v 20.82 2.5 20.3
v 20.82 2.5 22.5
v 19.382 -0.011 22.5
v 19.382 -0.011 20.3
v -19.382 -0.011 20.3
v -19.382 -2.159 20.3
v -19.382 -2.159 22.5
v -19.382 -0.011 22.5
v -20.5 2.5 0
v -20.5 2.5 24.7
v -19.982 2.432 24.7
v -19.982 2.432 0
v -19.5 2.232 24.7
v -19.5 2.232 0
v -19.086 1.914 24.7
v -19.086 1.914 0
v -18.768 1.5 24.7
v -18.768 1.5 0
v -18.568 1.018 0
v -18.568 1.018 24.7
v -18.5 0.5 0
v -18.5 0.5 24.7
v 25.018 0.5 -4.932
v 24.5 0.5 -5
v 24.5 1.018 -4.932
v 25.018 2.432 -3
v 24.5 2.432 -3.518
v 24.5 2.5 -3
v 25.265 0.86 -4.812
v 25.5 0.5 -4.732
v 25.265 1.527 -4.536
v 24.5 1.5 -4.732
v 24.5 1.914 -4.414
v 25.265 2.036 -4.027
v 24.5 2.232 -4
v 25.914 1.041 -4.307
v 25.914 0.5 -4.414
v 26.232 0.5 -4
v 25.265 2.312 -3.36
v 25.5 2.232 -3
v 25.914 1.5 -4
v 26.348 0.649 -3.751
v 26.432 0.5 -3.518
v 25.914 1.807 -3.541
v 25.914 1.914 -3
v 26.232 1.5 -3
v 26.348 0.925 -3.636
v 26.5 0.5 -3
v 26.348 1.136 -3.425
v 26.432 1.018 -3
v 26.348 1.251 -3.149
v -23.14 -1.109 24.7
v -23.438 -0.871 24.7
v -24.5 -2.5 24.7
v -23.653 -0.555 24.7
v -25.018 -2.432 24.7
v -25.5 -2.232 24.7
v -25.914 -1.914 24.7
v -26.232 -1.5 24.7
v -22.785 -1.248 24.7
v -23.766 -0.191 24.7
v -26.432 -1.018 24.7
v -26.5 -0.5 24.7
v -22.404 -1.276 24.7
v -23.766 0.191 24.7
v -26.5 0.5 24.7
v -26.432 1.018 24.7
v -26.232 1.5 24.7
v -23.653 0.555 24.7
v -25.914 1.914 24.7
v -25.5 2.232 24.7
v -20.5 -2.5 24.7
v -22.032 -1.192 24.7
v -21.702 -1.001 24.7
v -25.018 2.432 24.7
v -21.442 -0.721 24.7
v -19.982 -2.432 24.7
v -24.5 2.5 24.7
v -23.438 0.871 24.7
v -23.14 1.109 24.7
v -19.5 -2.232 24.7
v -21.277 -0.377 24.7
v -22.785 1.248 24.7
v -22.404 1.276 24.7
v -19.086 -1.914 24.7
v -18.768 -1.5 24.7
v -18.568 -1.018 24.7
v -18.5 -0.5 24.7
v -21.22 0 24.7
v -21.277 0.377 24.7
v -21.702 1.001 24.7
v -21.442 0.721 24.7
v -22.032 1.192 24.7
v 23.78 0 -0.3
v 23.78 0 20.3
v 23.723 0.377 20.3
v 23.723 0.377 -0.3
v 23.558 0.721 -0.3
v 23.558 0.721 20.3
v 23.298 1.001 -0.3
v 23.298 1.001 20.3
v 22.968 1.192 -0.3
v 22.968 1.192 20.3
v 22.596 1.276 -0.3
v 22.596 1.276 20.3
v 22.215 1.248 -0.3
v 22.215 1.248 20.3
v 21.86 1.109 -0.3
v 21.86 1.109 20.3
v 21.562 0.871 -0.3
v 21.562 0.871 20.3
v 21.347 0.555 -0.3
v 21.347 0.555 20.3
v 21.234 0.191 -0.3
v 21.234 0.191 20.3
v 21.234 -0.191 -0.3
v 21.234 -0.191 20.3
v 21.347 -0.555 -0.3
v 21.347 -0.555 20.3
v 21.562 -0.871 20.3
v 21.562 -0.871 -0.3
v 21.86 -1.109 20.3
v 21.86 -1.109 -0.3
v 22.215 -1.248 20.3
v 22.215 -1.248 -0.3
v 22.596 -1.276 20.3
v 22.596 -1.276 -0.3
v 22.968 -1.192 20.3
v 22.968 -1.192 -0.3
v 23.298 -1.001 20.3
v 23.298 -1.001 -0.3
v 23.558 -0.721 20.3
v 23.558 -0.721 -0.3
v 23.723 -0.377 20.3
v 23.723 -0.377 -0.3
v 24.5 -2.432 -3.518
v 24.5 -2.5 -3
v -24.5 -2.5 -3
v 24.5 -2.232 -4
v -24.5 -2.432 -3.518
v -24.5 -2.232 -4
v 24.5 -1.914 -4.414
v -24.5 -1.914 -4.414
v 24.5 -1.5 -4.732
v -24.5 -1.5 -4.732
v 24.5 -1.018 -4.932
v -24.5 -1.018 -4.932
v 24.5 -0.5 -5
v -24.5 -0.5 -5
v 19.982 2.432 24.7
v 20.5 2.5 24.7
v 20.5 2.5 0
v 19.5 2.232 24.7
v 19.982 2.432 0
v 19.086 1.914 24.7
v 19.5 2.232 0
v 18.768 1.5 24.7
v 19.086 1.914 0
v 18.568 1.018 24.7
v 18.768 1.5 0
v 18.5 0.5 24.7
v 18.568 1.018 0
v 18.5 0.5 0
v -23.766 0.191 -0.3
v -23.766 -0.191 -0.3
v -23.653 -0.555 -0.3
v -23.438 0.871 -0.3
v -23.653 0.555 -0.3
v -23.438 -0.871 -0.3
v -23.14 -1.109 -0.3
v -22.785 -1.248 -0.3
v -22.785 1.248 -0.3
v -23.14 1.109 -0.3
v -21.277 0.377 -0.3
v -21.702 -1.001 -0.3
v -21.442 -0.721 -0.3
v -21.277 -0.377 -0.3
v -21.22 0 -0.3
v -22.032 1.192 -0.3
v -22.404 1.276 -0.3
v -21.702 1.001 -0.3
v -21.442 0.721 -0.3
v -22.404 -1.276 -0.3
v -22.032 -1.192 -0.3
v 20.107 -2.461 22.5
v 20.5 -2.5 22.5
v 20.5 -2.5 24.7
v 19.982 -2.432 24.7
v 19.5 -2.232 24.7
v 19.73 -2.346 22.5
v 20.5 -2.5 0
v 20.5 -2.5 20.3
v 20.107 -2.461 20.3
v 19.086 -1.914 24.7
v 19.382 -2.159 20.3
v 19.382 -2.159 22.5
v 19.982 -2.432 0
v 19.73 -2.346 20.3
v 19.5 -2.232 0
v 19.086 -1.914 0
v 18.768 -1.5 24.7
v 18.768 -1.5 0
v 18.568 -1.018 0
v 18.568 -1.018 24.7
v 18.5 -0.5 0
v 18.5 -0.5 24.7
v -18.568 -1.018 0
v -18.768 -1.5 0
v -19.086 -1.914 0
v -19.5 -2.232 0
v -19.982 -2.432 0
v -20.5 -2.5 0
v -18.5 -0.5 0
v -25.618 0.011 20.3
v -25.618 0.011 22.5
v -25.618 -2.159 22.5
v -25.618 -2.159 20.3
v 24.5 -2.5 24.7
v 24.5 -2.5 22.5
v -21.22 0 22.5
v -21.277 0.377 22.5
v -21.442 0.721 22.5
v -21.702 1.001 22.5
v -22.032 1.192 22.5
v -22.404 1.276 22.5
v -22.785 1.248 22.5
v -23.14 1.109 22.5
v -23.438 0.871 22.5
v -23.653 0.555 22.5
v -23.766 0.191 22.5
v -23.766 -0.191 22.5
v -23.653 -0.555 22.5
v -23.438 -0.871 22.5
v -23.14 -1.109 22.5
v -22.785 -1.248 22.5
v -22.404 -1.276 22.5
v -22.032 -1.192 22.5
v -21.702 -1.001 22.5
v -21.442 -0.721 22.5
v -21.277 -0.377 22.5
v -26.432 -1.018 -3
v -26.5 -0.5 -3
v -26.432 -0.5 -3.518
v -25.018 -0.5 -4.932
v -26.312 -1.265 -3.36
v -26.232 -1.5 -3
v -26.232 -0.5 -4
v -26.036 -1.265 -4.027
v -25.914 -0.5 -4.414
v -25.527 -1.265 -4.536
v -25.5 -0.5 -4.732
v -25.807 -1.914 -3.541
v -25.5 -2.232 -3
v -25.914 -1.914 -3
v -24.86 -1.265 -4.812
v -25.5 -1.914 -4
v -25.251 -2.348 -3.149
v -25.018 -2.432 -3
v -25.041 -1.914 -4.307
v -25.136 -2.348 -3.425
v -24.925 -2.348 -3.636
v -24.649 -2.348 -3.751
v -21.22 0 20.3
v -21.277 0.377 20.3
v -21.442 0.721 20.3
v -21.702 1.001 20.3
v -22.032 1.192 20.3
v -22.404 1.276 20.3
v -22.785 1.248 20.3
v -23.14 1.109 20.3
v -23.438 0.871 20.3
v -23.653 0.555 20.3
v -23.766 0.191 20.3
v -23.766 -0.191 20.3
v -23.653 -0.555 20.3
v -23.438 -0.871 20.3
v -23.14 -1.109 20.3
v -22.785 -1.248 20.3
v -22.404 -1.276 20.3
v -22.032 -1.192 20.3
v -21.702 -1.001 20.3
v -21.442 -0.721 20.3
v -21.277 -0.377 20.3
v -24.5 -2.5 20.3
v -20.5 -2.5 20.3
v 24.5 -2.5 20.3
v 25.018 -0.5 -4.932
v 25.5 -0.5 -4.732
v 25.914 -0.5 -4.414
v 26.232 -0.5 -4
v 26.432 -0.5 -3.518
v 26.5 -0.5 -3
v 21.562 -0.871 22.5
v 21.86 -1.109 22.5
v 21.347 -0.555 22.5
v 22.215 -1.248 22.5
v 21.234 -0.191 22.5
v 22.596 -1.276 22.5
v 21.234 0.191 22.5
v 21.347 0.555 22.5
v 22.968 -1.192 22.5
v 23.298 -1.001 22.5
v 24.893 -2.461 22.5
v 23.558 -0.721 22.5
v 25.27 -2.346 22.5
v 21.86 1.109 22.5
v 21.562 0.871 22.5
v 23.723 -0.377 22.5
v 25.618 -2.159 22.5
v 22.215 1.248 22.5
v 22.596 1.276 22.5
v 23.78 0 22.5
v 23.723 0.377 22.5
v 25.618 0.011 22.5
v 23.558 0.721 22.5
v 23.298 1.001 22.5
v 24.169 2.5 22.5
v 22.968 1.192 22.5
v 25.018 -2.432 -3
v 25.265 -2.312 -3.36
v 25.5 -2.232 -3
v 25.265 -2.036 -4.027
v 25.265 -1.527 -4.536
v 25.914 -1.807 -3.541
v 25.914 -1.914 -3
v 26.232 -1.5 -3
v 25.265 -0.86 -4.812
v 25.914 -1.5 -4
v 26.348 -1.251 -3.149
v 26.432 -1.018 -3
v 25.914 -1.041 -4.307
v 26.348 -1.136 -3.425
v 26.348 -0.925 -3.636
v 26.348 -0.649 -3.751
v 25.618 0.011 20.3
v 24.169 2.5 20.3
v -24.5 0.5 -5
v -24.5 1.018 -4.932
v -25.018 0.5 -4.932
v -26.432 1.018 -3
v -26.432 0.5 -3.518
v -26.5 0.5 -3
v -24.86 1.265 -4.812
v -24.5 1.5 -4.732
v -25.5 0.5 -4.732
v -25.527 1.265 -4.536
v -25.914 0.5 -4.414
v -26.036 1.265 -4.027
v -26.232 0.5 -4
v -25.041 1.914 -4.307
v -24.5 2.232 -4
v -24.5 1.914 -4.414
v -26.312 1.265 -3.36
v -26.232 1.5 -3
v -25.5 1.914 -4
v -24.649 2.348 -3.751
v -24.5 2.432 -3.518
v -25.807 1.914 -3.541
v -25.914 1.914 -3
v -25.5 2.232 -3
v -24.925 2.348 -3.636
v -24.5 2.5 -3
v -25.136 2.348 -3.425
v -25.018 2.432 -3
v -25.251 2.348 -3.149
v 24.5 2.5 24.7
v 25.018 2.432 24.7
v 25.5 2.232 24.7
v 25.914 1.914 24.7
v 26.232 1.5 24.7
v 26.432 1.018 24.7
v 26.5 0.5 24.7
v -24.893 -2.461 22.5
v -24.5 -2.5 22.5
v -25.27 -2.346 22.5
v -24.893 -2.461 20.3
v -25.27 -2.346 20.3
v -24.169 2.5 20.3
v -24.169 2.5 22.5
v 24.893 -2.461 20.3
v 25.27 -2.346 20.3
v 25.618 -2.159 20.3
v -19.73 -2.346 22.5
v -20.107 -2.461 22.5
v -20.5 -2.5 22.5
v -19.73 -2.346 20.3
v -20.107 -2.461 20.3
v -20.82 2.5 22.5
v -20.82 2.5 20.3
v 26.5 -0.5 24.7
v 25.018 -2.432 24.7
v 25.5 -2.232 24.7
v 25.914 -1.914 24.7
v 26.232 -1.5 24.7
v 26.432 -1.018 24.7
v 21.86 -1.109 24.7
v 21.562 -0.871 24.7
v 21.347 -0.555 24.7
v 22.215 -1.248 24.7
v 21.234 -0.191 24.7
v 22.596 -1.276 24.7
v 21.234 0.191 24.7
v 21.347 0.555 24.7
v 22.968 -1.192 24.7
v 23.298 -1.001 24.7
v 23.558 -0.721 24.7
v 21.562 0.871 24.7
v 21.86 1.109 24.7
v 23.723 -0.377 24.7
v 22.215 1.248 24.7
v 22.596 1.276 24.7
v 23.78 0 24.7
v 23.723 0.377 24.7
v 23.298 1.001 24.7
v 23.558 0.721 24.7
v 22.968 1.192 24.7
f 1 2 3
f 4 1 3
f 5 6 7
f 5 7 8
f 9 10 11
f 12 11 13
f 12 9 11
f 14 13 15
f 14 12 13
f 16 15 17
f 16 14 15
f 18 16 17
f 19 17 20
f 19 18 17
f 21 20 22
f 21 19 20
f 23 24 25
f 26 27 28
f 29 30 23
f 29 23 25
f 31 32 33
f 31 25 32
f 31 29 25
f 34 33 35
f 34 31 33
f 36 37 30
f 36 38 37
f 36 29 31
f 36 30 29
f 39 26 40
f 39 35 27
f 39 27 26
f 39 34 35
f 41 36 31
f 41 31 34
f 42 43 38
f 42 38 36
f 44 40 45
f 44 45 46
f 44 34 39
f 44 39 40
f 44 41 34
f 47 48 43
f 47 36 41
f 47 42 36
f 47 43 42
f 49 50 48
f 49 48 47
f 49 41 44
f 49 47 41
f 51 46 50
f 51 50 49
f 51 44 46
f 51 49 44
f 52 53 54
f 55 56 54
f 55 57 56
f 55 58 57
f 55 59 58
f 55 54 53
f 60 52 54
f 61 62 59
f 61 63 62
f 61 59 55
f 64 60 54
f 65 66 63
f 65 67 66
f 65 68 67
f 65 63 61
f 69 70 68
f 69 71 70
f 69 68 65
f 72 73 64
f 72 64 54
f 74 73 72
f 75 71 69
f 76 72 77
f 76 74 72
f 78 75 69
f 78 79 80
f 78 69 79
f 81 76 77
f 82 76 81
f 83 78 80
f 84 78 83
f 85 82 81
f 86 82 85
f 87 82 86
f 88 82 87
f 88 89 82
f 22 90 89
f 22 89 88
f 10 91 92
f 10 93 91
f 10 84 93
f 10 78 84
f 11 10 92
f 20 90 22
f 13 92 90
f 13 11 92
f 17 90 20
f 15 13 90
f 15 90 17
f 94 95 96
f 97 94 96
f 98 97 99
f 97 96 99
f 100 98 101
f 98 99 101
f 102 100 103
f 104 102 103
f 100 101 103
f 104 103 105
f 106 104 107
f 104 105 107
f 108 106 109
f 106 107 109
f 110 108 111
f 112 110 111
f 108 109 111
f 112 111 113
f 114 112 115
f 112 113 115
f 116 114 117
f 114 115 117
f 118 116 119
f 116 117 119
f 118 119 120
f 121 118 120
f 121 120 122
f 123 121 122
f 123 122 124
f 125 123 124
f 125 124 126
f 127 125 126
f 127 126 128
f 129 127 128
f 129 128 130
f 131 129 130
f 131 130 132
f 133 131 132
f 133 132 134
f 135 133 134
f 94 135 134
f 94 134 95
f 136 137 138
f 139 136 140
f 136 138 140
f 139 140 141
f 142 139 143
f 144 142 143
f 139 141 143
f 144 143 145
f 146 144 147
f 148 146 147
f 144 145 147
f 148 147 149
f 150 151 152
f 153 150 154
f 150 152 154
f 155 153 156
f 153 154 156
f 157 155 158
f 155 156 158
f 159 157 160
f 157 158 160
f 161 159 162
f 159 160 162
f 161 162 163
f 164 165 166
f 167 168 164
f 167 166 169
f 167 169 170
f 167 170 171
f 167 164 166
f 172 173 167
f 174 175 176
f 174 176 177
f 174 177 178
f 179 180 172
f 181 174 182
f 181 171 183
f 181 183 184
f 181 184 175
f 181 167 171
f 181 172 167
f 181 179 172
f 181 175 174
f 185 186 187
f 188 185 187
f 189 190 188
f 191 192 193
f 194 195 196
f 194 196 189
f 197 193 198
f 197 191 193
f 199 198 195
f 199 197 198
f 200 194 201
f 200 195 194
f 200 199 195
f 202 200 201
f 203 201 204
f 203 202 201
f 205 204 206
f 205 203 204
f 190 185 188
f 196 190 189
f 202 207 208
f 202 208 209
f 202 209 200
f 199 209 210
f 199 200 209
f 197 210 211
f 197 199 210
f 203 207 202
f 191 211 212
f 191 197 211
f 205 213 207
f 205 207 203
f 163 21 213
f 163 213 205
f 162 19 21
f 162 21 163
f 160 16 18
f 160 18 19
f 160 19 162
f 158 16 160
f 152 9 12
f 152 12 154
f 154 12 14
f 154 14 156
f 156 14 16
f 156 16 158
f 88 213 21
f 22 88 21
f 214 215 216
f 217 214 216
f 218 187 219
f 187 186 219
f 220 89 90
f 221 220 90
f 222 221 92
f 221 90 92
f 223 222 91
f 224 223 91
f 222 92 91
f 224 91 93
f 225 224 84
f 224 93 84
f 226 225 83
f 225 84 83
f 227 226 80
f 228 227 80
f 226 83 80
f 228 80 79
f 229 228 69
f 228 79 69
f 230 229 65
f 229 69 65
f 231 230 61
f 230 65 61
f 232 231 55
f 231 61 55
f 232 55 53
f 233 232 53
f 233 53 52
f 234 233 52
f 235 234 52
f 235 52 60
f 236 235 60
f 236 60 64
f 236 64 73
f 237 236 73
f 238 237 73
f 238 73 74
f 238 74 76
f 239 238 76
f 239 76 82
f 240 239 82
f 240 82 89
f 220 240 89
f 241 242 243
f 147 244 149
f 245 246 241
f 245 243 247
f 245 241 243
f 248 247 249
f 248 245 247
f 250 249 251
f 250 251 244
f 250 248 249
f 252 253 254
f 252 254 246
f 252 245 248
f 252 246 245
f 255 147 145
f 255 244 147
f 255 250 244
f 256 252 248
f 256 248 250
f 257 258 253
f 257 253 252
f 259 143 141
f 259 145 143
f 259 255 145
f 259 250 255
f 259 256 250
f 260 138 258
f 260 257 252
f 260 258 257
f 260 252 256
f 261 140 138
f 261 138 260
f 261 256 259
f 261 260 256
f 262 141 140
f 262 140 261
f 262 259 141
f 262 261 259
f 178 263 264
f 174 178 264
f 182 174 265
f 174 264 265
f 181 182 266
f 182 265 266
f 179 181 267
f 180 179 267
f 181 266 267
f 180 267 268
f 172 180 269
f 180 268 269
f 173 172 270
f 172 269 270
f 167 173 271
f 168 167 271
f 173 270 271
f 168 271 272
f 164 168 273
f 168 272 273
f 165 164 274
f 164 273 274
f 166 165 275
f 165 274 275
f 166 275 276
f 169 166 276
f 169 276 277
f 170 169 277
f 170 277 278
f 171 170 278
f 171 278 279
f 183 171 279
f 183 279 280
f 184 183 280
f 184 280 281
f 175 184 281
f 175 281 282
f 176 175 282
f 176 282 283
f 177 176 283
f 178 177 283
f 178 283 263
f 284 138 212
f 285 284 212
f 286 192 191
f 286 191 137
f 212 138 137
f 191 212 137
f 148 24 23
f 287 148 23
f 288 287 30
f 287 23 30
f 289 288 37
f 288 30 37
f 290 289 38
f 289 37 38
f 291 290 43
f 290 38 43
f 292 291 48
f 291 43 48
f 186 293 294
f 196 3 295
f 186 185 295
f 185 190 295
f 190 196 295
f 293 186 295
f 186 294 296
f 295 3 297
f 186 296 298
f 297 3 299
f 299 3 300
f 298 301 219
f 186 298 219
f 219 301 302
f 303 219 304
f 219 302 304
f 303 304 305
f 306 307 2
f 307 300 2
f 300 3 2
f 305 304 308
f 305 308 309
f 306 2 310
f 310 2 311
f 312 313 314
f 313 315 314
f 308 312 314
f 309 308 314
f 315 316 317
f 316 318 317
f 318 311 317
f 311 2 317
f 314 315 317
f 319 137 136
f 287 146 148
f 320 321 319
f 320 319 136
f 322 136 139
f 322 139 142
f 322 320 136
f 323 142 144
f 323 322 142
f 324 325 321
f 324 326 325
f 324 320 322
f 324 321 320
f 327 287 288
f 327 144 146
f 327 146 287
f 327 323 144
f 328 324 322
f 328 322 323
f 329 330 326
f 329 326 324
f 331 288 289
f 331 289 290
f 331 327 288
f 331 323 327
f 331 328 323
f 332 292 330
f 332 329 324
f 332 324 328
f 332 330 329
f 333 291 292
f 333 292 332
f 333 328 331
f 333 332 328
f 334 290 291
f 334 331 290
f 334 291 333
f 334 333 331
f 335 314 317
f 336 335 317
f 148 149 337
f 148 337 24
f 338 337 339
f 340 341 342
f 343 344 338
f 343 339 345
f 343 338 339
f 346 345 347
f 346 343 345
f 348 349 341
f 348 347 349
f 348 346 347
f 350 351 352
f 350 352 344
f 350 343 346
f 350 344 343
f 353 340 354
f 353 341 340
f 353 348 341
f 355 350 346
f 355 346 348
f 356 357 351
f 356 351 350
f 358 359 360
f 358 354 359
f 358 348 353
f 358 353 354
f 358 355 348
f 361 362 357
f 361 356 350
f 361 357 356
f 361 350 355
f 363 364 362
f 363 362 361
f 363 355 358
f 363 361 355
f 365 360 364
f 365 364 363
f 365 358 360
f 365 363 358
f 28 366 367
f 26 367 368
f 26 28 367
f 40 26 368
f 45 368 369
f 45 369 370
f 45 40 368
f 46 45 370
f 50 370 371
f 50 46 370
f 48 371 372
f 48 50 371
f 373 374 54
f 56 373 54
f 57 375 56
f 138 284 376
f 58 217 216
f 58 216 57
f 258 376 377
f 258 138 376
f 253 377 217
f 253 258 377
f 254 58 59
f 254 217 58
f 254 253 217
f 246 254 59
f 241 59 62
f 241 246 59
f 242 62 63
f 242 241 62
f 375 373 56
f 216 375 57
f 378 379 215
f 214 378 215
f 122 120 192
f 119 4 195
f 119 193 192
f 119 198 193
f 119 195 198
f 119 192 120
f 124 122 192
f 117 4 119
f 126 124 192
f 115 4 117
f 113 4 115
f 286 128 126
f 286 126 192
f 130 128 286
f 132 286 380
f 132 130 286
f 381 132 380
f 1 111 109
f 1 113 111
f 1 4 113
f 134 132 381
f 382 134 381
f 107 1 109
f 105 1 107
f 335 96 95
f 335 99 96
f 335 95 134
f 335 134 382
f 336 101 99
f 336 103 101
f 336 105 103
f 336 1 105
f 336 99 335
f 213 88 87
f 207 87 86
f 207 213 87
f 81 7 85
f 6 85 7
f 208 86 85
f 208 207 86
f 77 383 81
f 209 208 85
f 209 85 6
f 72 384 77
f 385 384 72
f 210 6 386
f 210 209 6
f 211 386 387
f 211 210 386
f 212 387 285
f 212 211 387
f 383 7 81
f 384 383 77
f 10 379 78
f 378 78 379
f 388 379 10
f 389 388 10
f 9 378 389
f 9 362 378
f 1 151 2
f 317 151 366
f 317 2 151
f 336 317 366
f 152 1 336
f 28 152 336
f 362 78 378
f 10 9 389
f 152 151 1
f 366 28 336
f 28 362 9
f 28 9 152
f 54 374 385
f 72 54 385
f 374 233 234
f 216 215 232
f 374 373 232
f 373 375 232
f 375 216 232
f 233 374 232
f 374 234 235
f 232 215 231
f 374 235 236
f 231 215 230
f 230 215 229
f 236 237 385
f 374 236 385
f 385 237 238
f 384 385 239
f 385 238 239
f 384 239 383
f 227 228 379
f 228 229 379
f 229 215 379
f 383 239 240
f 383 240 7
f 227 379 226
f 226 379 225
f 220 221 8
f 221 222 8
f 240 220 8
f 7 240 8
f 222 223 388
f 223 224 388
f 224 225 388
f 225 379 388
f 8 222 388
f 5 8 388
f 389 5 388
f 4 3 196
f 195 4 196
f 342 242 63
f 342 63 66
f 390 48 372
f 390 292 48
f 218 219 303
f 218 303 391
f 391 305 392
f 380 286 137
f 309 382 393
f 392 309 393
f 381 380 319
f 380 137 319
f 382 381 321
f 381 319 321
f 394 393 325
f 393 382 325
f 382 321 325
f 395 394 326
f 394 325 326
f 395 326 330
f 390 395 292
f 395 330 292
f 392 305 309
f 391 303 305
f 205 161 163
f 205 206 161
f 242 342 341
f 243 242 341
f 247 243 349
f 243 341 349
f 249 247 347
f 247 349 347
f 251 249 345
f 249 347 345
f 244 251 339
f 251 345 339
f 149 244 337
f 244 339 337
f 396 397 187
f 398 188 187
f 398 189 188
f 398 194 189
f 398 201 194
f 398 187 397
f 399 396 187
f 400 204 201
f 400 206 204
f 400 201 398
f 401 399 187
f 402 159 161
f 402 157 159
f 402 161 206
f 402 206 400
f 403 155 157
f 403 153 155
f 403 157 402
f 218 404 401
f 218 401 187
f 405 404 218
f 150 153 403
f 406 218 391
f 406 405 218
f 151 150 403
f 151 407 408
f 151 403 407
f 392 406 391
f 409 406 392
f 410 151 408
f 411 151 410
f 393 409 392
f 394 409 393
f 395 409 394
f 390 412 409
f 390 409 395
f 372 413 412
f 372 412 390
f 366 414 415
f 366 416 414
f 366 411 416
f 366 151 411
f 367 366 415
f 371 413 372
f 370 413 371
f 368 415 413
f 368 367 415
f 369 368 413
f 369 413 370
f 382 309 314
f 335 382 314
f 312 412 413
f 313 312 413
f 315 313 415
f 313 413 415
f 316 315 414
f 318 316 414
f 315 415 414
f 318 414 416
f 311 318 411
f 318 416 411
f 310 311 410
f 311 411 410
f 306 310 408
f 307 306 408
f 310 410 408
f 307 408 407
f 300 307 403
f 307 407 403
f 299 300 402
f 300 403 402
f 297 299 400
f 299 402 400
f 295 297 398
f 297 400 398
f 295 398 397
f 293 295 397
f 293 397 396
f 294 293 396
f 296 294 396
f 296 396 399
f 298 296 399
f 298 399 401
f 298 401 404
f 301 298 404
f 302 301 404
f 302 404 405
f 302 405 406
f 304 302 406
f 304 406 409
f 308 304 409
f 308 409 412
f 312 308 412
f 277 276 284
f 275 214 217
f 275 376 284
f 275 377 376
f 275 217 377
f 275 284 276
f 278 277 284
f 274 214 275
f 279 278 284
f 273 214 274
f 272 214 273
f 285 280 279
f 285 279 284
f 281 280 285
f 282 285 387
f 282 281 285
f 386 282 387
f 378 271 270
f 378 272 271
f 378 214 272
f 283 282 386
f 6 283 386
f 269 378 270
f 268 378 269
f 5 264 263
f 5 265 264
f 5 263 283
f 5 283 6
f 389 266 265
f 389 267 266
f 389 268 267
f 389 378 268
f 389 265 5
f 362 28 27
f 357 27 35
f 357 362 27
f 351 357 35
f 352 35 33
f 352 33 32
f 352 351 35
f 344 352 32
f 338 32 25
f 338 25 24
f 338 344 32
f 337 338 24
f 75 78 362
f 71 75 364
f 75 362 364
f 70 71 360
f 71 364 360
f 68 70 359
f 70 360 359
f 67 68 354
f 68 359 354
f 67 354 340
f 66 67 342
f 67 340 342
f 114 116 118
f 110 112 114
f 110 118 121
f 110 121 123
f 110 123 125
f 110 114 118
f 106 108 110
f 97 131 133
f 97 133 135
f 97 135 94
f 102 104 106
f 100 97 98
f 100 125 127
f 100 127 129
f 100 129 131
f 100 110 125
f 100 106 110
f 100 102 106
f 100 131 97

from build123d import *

# Parameters (mm, degrees)
F0_W         = 5.2
F0_H         = 2
F1_DEPTH     = 2.5
F3_DEPTH     = 2.2
F4_W         = 8
F4_H         = 5
F5_DEPTH     = 2.2
F6_R         = 1.28
F7_DEPTH     = 25
F8_T1_DEPTH  = 1
F8_T3_DEPTH  = 49
F8_T5_DEPTH  = 29.7
F8_T7_DEPTH  = 32.7
F8_S11_W     = 2
F8_S11_H     = 2
F8_T12_DEPTH = 2
F8_S17_W     = 2
F8_S17_H     = 2
F8_T18_DEPTH = 2
F8_S23_W     = 2
F8_S23_H     = 2
F8_T24_DEPTH = 2
F8_S29_W     = 2
F8_S29_H     = 2
F8_T30_DEPTH = 2


# Not quite as in the source:
# - a fillet or chamfer that OpenCascade refuses, or shapes differently, is made with other operations: its cross-section is extruded or revolved along the edge and cut away or added


with BuildPart() as f1:
    # F0 (on Front) → F1 (new body, symmetric)
    with BuildSketch(Plane.XZ):
        Polygon((18.5, 0), (0, 0), (0, -5), (26.5, -5), (26.5, 0), (22.5, 0), align=None)
        Polygon((18.5, 22.5), (18.5, 0), (22.5, 0), (26.5, 0), (26.5, 22.5), (25.1, 22.5), (25.1, 20.5), (19.9, 20.5), (19.9, 22.5), align=None)
        with Locations((22.5, 21.5)):
            Rectangle(F0_W, F0_H)
        Polygon((0, -5), (0, 0), (-18.5, 0), (-22.5, 0), (-26.5, 0), (-26.5, -5), align=None)
        Polygon((-22.5, 0), (-18.5, 0), (-18.5, 22.5), (-19.9, 22.5), (-19.9, 20.5), (-25.1, 20.5), (-25.1, 22.5), (-26.5, 22.5), (-26.5, 0), align=None)
        with Locations((-22.5, 21.5)):
            Rectangle(F0_W, F0_H)
    extrude(amount=F1_DEPTH, both=True)

    # F2 (on face) → F3 (cut)
    with BuildSketch(Plane.XY.offset(22.5)):
        Polygon((19.3823289357, -2.5), (20.8312208665, -2.5), (19.3823289357, -0.011275415), align=None)
        Polygon((20.8312208665, -2.5), (24.1798700484, -2.5), (25.6176710643, 0.011275415), (24.1687791335, 2.5), (20.8201299516, 2.5), (19.3823289357, -0.011275415), align=None)
        Polygon((24.068600328, -2.6943446348), (24.1798700484, -2.5), (20.8312208665, -2.5), (20.9509292637, -2.7056200498), align=None)
        Polygon((24.1798700484, -2.5), (25.6176710643, -2.5), (25.6176710643, 0.011275415), align=None)
        Polygon((-24.1798700484, -2.5), (-20.8312208665, -2.5), (-19.3823289357, -0.011275415), (-20.8201299516, 2.5), (-24.1687791335, 2.5), (-25.6176710643, 0.011275415), align=None)
        Polygon((-20.9509292637, -2.7056200498), (-20.8312208665, -2.5), (-24.1798700484, -2.5), (-24.068600328, -2.6943446348), align=None)
        Polygon((-25.6176710643, -2.5), (-24.1798700484, -2.5), (-25.6176710643, 0.011275415), align=None)
        Polygon((-20.8312208665, -2.5), (-19.3823289357, -2.5), (-19.3823289357, -0.011275415), align=None)
    extrude(amount=-F3_DEPTH, mode=Mode.SUBTRACT)

    # F4 (on face) → F5 (join)
    with BuildSketch(Plane.XY.offset(22.5)):
        with Locations((-22.5, 0)):
            Rectangle(F4_W, F4_H)
        Polygon((25.6176710643, 0.011275415), (24.1687791335, 2.5), (18.5, 2.5), (18.5, -2.5), (25.6176710643, -2.5), align=None)
        Polygon((26.5, -2.5), (26.5, 2.5), (24.1687791335, 2.5), (25.6176710643, 0.011275415), (25.6176710643, -2.5), align=None)
    extrude(amount=F5_DEPTH)

    # F6 (on face) → F7 (cut)
    with BuildSketch(Plane.XY.offset(24.7)):
        with Locations((-22.5, 0)):
            Circle(F6_R)
        with Locations((22.5, 0)):
            Circle(F6_R)
    extrude(amount=-F7_DEPTH, mode=Mode.SUBTRACT)

    # F8: fillet of radius 2 on 12 edges, made by hand

    # F8_s2 → F8_t1 (cut)
    with BuildSketch(Plane.XZ.offset(-0.5)):
        with BuildLine():
            ThreePointArc((-26.5, -3), (-25.9142135624, -4.4142135624), (-24.5, -5))
            Line((-24.5, -5), (-26.5, -5))
            Line((-26.5, -5), (-26.5, -3))
        make_face()
        with BuildLine():
            ThreePointArc((24.5, -5), (25.9142135624, -4.4142135624), (26.5, -3))
            Line((26.5, -3), (26.5, -5))
            Line((26.5, -5), (24.5, -5))
        make_face()
    extrude(amount=F8_T1_DEPTH, mode=Mode.SUBTRACT)

    # F8_s4 → F8_t3 (cut)
    with BuildSketch(Plane.YZ.offset(-24.5)):
        with BuildLine():
            ThreePointArc((2.5, -3), (1.9142135624, -4.4142135624), (0.5, -5))
            Line((0.5, -5), (2.5, -5))
            Line((2.5, -5), (2.5, -3))
        make_face()
        with BuildLine():
            ThreePointArc((-2.5, -3), (-1.9142135624, -4.4142135624), (-0.5, -5))
            Line((-0.5, -5), (-2.5, -5))
            Line((-2.5, -5), (-2.5, -3))
        make_face()
    extrude(amount=F8_T3_DEPTH, mode=Mode.SUBTRACT)

    # F8_s6 → F8_t5 (cut)
    with BuildSketch(Plane.XY):
        with BuildLine():
            ThreePointArc((20.5, -2.5), (19.0857864376, -1.9142135624), (18.5, -0.5))
            Line((18.5, -0.5), (18.5, -2.5))
            Line((18.5, -2.5), (20.5, -2.5))
        make_face()
        with BuildLine():
            ThreePointArc((20.5, 2.5), (19.0857864376, 1.9142135624), (18.5, 0.5))
            Line((18.5, 0.5), (18.5, 2.5))
            Line((18.5, 2.5), (20.5, 2.5))
        make_face()
        with BuildLine():
            ThreePointArc((-18.5, -0.5), (-19.0857864376, -1.9142135624), (-20.5, -2.5))
            Line((-20.5, -2.5), (-18.5, -2.5))
            Line((-18.5, -2.5), (-18.5, -0.5))
        make_face()
        with BuildLine():
            ThreePointArc((-20.5, 2.5), (-19.0857864376, 1.9142135624), (-18.5, 0.5))
            Line((-18.5, 0.5), (-18.5, 2.5))
            Line((-18.5, 2.5), (-20.5, 2.5))
        make_face()
    extrude(amount=F8_T5_DEPTH, mode=Mode.SUBTRACT)

    # F8_s8 → F8_t7 (cut)
    with BuildSketch(Plane.XY.offset(-3)):
        with BuildLine():
            ThreePointArc((24.5, -2.5), (25.9142135624, -1.9142135624), (26.5, -0.5))
            Line((26.5, -0.5), (26.5, -2.5))
            Line((26.5, -2.5), (24.5, -2.5))
        make_face()
        with BuildLine():
            ThreePointArc((24.5, 2.5), (25.9142135624, 1.9142135624), (26.5, 0.5))
            Line((26.5, 0.5), (26.5, 2.5))
            Line((26.5, 2.5), (24.5, 2.5))
        make_face()
        with BuildLine():
            ThreePointArc((-24.5, -2.5), (-25.9142135624, -1.9142135624), (-26.5, -0.5))
            Line((-26.5, -0.5), (-26.5, -2.5))
            Line((-26.5, -2.5), (-24.5, -2.5))
        make_face()
        with BuildLine():
            ThreePointArc((-24.5, 2.5), (-25.9142135624, 1.9142135624), (-26.5, 0.5))
            Line((-26.5, 0.5), (-26.5, 2.5))
            Line((-26.5, 2.5), (-24.5, 2.5))
        make_face()
    extrude(amount=F8_T7_DEPTH, mode=Mode.SUBTRACT)


with BuildPart() as f8_tool10:
    # F8_s11 → F8_t12 (new body)
    with BuildSketch(Plane.XZ.offset(-0.5)):
        with Locations((-25.5, -4)):
            Rectangle(F8_S11_W, F8_S11_H)
    extrude(amount=-F8_T12_DEPTH)

    # F8_s13 → F8_t14 (revolve, cut)
    with BuildSketch(Plane(origin=(-24.5, 0.5, -3), x_dir=(0.7071067812, 0, 0.7071067812), z_dir=(-0.7071067812, 0, 0.7071067812))):
        with BuildLine():
            ThreePointArc((0, -2), (2, 0), (0, 2))
            Line((0, 2), (0, -2))
        make_face()
    revolve(axis=Axis((-24.5, 0.5, -3), (0, 1, 0)), mode=Mode.SUBTRACT)


with BuildPart() as f1_1:
    add(f1.part)

    # F8_t9: cut F8_tool10
    add(f8_tool10.part, mode=Mode.SUBTRACT)


with BuildPart() as f8_tool16:
    # F8_s17 → F8_t18 (new body)
    with BuildSketch(Plane.XZ.offset(0.5)):
        with Locations((-25.5, -4)):
            Rectangle(F8_S17_W, F8_S17_H)
    extrude(amount=F8_T18_DEPTH)

    # F8_s19 → F8_t20 (revolve, cut)
    with BuildSketch(Plane(origin=(-24.5, -0.5, -3), x_dir=(0.7071067812, 0, 0.7071067812), z_dir=(0.7071067812, 0, -0.7071067812))):
        with BuildLine():
            ThreePointArc((0, -2), (2, 0), (0, 2))
            Line((0, 2), (0, -2))
        make_face()
    revolve(axis=Axis((-24.5, -0.5, -3), (0, -1, 0)), mode=Mode.SUBTRACT)


with BuildPart() as f1_2:
    add(f1_1.part)

    # F8_t15: cut F8_tool16
    add(f8_tool16.part, mode=Mode.SUBTRACT)


with BuildPart() as f8_tool22:
    # F8_s23 → F8_t24 (new body)
    with BuildSketch(Plane.YZ.offset(24.5)):
        with Locations((1.5, -4)):
            Rectangle(F8_S23_W, F8_S23_H)
    extrude(amount=F8_T24_DEPTH)

    # F8_s25 → F8_t26 (revolve, cut)
    with BuildSketch(Plane(origin=(24.5, 0.5, -3), x_dir=(0, -0.7071067812, 0.7071067812), z_dir=(0, 0.7071067812, 0.7071067812))):
        with BuildLine():
            ThreePointArc((0, -2), (2, 0), (0, 2))
            Line((0, 2), (0, -2))
        make_face()
    revolve(axis=Axis((24.5, 0.5, -3), (1, 0, 0)), mode=Mode.SUBTRACT)


with BuildPart() as f1_3:
    add(f1_2.part)

    # F8_t21: cut F8_tool22
    add(f8_tool22.part, mode=Mode.SUBTRACT)


with BuildPart() as f8_tool28:
    # F8_s29 → F8_t30 (new body)
    with BuildSketch(Plane.YZ.offset(24.5)):
        with Locations((-1.5, -4)):
            Rectangle(F8_S29_W, F8_S29_H)
    extrude(amount=F8_T30_DEPTH)

    # F8_s31 → F8_t32 (revolve, cut)
    with BuildSketch(Plane(origin=(24.5, -0.5, -3), x_dir=(0, 0.7071067812, 0.7071067812), z_dir=(0, 0.7071067812, -0.7071067812))):
        with BuildLine():
            ThreePointArc((0, -2), (2, 0), (0, 2))
            Line((0, 2), (0, -2))
        make_face()
    revolve(axis=Axis((24.5, -0.5, -3), (1, 0, 0)), mode=Mode.SUBTRACT)


with BuildPart() as f1_4:
    add(f1_3.part)

    # F8_t27: cut F8_tool28
    add(f8_tool28.part, mode=Mode.SUBTRACT)


solid = f1_4.part
